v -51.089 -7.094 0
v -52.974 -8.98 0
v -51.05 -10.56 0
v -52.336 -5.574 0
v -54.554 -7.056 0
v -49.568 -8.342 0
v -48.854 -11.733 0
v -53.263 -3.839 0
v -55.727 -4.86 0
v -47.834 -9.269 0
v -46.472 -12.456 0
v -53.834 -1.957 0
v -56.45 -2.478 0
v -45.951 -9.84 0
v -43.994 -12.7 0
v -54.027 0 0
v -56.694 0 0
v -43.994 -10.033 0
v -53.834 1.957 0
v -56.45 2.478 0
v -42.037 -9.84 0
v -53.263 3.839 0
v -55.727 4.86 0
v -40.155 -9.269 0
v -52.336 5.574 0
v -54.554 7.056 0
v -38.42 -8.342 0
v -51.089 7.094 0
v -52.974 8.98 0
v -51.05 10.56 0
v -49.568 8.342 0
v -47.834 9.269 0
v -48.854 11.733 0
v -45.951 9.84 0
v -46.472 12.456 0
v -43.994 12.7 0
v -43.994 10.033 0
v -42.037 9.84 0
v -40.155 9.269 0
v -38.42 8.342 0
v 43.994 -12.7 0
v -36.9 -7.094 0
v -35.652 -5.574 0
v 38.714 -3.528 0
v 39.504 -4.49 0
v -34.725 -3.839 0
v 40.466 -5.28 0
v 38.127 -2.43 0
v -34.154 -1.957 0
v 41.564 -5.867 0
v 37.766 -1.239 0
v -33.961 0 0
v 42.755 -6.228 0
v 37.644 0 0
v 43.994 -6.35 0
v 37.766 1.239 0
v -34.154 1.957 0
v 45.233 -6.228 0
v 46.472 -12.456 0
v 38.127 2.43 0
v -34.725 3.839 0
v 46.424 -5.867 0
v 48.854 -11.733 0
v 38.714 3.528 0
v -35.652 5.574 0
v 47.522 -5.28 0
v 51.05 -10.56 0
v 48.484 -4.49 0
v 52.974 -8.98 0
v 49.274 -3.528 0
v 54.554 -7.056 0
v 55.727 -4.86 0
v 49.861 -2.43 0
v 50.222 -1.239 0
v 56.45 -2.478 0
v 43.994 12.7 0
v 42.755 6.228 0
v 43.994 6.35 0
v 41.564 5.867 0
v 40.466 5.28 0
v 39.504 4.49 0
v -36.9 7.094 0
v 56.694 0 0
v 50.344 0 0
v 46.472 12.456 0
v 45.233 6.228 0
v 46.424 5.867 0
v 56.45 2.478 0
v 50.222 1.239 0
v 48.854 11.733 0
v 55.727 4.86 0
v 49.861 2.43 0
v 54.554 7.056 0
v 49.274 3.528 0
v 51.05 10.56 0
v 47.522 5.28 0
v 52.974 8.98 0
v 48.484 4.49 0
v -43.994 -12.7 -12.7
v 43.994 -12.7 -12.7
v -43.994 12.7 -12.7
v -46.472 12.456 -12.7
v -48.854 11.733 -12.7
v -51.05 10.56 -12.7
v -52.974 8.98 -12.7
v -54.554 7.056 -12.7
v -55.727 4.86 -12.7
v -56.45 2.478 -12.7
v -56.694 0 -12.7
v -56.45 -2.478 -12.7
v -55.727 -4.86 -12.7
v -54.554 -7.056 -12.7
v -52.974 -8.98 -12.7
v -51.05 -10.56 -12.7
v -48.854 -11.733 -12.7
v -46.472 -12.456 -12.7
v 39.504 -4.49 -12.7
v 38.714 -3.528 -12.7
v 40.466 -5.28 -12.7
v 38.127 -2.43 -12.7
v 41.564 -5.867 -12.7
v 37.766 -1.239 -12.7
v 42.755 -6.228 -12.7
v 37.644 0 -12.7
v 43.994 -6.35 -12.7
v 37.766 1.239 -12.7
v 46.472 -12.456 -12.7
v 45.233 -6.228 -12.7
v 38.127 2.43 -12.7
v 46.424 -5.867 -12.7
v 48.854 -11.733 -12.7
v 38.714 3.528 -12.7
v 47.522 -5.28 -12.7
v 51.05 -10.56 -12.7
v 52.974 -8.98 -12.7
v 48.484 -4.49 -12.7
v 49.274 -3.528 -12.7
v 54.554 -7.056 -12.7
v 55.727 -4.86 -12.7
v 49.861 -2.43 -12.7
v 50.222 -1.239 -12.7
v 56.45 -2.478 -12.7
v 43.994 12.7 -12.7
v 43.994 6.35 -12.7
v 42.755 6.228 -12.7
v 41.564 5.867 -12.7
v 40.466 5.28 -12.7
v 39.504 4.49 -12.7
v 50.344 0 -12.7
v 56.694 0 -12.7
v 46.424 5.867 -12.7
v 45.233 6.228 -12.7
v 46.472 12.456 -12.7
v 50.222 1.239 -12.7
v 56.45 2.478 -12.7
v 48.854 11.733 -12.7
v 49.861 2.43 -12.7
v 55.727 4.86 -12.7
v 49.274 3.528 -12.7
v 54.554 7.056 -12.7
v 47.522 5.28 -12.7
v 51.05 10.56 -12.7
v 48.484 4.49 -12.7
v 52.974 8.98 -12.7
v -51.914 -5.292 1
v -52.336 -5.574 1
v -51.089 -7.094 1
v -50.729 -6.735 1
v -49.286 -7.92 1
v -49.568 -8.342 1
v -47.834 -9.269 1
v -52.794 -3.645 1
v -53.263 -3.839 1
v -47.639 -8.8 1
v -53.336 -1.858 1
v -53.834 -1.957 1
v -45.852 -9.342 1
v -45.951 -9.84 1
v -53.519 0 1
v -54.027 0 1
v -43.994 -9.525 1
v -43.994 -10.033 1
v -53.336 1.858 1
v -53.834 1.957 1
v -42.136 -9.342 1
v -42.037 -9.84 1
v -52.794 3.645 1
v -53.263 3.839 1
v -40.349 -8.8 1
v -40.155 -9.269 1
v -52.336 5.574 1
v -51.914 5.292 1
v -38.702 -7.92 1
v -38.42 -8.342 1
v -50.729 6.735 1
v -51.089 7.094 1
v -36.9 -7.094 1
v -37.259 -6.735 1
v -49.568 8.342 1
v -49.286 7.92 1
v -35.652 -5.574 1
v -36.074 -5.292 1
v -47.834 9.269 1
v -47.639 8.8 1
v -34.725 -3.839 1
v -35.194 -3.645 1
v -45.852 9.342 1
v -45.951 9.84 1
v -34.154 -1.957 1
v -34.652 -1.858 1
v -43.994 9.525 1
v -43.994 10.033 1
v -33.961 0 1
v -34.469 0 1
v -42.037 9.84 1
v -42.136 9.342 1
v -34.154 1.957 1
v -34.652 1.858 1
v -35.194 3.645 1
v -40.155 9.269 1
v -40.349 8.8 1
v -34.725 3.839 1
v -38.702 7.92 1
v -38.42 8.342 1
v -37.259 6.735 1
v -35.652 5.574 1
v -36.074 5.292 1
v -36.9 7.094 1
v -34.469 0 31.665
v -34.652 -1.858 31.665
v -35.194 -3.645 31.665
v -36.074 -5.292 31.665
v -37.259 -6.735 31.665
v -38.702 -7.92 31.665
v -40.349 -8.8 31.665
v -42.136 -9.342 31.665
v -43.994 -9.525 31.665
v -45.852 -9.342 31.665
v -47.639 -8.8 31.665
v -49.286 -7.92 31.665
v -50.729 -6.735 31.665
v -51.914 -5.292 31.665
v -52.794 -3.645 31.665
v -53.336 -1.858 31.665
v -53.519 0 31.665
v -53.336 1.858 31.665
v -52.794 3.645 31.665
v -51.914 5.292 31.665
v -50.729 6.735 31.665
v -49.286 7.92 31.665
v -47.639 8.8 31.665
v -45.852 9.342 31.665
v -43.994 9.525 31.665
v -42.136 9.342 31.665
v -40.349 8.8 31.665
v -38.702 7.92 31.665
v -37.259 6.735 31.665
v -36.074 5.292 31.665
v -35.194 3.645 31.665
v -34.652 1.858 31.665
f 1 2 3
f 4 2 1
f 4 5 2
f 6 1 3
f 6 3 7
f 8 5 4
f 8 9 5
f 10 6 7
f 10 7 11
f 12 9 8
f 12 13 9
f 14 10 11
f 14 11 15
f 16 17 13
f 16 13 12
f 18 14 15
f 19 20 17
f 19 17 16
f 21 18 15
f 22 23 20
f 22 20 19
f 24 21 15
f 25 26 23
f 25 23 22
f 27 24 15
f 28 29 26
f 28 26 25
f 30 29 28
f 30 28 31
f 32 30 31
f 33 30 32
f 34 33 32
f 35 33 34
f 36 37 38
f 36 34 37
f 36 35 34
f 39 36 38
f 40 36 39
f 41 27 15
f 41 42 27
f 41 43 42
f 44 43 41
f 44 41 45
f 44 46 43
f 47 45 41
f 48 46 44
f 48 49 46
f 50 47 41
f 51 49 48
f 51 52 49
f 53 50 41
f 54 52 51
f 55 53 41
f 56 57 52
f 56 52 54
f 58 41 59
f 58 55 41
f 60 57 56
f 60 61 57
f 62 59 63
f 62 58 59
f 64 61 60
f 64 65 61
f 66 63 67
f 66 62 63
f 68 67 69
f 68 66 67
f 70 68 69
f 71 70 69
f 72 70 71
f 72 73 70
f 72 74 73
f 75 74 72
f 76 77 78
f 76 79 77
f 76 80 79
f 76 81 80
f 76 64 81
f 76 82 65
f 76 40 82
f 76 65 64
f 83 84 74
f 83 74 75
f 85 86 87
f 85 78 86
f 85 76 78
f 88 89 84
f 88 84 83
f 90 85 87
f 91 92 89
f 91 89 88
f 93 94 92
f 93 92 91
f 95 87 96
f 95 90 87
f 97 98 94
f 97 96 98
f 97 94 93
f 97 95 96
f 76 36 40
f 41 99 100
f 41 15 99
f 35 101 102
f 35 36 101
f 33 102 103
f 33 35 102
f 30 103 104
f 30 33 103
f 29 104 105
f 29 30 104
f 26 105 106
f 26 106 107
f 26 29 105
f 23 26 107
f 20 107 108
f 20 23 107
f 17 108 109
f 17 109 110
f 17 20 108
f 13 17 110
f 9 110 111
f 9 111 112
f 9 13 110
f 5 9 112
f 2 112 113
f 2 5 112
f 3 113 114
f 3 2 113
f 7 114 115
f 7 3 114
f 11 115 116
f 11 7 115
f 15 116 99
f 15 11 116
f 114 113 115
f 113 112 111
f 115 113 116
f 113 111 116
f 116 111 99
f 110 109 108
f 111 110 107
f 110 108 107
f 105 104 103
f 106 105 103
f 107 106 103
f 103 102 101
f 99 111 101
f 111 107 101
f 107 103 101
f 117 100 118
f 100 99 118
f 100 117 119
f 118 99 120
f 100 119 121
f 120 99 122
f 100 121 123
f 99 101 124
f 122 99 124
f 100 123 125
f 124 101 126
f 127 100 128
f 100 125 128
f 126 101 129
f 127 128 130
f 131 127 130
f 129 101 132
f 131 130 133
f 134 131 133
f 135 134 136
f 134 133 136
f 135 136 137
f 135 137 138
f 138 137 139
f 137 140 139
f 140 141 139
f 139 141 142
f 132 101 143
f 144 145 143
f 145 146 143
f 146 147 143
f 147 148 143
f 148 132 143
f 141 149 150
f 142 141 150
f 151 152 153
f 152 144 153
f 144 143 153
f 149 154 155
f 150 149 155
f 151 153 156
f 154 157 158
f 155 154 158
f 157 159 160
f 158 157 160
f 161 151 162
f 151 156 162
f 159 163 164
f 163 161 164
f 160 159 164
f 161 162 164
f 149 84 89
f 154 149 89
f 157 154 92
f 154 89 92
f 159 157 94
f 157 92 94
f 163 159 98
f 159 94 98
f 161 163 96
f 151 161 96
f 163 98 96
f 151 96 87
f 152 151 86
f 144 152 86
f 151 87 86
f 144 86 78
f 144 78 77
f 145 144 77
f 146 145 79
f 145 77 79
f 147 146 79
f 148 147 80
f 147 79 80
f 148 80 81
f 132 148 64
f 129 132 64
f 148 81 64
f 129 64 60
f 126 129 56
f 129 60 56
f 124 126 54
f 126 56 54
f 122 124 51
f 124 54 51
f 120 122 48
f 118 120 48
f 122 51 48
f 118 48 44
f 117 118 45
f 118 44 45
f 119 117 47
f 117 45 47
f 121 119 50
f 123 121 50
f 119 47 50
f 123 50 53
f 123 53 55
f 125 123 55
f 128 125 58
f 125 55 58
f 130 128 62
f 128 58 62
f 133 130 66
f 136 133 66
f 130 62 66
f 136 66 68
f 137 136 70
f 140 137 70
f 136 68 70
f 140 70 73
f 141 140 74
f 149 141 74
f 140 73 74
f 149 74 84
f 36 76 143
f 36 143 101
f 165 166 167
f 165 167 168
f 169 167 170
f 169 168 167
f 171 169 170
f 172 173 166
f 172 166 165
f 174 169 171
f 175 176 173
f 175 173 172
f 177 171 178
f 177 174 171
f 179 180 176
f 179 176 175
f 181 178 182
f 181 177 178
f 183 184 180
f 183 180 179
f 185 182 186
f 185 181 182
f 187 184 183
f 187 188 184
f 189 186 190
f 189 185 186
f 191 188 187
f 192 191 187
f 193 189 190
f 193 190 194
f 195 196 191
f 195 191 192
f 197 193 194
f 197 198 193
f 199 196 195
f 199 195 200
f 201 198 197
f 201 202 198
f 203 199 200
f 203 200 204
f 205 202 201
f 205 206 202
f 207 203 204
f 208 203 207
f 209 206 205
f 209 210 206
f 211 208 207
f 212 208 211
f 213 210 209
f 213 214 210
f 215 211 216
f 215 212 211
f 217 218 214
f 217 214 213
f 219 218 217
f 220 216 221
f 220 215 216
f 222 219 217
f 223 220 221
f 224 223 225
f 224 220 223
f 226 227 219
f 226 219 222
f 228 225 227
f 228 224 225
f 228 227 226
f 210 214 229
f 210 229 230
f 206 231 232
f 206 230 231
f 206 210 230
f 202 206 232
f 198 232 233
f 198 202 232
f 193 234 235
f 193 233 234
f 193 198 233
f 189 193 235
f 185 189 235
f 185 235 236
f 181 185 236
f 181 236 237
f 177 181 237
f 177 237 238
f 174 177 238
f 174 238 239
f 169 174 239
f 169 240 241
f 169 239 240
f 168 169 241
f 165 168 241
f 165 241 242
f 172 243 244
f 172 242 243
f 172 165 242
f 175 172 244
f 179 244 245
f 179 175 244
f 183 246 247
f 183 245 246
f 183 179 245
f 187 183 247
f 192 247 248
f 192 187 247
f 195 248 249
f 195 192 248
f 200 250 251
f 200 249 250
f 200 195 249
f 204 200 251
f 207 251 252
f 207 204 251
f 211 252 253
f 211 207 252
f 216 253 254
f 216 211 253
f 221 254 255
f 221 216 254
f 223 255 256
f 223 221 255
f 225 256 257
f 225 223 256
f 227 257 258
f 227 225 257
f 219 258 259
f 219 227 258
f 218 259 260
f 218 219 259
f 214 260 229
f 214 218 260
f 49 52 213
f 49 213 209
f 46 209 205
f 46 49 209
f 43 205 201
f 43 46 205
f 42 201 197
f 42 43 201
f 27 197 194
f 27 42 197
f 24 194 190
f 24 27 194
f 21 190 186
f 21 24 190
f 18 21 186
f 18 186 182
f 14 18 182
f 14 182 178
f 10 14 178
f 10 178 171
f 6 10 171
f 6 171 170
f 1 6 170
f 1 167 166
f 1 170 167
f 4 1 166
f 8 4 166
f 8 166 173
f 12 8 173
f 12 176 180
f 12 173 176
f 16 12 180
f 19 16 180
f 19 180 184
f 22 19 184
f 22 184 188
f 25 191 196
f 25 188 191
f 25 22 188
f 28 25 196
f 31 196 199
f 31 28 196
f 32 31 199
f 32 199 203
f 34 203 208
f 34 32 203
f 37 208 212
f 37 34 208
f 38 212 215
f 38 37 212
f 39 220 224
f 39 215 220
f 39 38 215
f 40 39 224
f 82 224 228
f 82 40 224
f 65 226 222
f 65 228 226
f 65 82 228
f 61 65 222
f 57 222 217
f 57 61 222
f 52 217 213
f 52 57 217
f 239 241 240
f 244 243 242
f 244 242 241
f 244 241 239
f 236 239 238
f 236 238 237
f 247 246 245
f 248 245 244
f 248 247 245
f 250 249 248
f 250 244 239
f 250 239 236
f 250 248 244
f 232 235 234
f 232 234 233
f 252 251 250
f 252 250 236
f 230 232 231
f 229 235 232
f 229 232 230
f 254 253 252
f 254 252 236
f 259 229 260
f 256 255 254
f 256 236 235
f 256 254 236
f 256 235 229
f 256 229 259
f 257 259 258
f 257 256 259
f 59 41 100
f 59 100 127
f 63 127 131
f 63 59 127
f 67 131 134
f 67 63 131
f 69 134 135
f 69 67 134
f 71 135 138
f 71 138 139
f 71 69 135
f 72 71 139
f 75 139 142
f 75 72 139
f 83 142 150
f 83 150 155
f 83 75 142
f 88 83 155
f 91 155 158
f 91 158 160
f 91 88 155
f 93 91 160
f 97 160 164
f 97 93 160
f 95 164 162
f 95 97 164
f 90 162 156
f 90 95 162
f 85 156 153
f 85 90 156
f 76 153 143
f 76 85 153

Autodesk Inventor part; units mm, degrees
ref_plane "YZ Plane" through (0, 0, 0) normal (1, 0, 0) x (0, 1, 0)
ref_plane "XZ Plane" through (0, 0, 0) normal (0, 1, 0) x (-1, 0, 0)
ref_plane "XY Plane" through (0, 0, 0) normal (0, 0, 1) x (1, 0, 0)
sketch "Sketch1" plane through (0, 0, 0) normal (0, 0, 1) x (1, 0, 0)
  circle A0 centre (-43.9941, 0) radius 9.525
  circle A1 centre (43.9941, 0) radius 6.35
  line L0 (43.9941, 0) -> (-43.9941, 0) construction
  line L1 (43.9941, 12.7) -> (-43.9941, 12.7)
  line L2 (-43.9941, -12.7) -> (43.9941, -12.7)
  arc A2 (43.9941, -12.7) -> (43.9941, 12.7) centre (43.9941, 0) ccw
  arc A3 (-43.9941, 12.7) -> (-43.9941, -12.7) centre (-43.9941, 0) ccw
  point P0 (0, 0)
  point P1 (0, 0)
  dimension "d10" = 12.7
  dimension "d11" = 19.05
  dimension "d12" = 87.9881
  dimension "d13" = 12.7
extrude "Extrusion1" add sketch "Sketch1" against normal blind 12.7
extrude "Extrusion2" add sketch "Sketch1" along normal blind 31.6653 and the other way blind 12.7 contours A0
sketch "Sketch2" plane through (0, 0, 0) normal (0, 0, 1) x (1, 0, 0)
  circle A0 centre (-43.9941, 0) radius 9.525 projected
  circle A1 centre (-43.9941, 0) radius 10.033
  point P0 (0, 0)
  dimension "d20" = 20.066
extrude "Extrusion3" add sketch "Sketch2" along normal blind 1
properties part number "Frame"
